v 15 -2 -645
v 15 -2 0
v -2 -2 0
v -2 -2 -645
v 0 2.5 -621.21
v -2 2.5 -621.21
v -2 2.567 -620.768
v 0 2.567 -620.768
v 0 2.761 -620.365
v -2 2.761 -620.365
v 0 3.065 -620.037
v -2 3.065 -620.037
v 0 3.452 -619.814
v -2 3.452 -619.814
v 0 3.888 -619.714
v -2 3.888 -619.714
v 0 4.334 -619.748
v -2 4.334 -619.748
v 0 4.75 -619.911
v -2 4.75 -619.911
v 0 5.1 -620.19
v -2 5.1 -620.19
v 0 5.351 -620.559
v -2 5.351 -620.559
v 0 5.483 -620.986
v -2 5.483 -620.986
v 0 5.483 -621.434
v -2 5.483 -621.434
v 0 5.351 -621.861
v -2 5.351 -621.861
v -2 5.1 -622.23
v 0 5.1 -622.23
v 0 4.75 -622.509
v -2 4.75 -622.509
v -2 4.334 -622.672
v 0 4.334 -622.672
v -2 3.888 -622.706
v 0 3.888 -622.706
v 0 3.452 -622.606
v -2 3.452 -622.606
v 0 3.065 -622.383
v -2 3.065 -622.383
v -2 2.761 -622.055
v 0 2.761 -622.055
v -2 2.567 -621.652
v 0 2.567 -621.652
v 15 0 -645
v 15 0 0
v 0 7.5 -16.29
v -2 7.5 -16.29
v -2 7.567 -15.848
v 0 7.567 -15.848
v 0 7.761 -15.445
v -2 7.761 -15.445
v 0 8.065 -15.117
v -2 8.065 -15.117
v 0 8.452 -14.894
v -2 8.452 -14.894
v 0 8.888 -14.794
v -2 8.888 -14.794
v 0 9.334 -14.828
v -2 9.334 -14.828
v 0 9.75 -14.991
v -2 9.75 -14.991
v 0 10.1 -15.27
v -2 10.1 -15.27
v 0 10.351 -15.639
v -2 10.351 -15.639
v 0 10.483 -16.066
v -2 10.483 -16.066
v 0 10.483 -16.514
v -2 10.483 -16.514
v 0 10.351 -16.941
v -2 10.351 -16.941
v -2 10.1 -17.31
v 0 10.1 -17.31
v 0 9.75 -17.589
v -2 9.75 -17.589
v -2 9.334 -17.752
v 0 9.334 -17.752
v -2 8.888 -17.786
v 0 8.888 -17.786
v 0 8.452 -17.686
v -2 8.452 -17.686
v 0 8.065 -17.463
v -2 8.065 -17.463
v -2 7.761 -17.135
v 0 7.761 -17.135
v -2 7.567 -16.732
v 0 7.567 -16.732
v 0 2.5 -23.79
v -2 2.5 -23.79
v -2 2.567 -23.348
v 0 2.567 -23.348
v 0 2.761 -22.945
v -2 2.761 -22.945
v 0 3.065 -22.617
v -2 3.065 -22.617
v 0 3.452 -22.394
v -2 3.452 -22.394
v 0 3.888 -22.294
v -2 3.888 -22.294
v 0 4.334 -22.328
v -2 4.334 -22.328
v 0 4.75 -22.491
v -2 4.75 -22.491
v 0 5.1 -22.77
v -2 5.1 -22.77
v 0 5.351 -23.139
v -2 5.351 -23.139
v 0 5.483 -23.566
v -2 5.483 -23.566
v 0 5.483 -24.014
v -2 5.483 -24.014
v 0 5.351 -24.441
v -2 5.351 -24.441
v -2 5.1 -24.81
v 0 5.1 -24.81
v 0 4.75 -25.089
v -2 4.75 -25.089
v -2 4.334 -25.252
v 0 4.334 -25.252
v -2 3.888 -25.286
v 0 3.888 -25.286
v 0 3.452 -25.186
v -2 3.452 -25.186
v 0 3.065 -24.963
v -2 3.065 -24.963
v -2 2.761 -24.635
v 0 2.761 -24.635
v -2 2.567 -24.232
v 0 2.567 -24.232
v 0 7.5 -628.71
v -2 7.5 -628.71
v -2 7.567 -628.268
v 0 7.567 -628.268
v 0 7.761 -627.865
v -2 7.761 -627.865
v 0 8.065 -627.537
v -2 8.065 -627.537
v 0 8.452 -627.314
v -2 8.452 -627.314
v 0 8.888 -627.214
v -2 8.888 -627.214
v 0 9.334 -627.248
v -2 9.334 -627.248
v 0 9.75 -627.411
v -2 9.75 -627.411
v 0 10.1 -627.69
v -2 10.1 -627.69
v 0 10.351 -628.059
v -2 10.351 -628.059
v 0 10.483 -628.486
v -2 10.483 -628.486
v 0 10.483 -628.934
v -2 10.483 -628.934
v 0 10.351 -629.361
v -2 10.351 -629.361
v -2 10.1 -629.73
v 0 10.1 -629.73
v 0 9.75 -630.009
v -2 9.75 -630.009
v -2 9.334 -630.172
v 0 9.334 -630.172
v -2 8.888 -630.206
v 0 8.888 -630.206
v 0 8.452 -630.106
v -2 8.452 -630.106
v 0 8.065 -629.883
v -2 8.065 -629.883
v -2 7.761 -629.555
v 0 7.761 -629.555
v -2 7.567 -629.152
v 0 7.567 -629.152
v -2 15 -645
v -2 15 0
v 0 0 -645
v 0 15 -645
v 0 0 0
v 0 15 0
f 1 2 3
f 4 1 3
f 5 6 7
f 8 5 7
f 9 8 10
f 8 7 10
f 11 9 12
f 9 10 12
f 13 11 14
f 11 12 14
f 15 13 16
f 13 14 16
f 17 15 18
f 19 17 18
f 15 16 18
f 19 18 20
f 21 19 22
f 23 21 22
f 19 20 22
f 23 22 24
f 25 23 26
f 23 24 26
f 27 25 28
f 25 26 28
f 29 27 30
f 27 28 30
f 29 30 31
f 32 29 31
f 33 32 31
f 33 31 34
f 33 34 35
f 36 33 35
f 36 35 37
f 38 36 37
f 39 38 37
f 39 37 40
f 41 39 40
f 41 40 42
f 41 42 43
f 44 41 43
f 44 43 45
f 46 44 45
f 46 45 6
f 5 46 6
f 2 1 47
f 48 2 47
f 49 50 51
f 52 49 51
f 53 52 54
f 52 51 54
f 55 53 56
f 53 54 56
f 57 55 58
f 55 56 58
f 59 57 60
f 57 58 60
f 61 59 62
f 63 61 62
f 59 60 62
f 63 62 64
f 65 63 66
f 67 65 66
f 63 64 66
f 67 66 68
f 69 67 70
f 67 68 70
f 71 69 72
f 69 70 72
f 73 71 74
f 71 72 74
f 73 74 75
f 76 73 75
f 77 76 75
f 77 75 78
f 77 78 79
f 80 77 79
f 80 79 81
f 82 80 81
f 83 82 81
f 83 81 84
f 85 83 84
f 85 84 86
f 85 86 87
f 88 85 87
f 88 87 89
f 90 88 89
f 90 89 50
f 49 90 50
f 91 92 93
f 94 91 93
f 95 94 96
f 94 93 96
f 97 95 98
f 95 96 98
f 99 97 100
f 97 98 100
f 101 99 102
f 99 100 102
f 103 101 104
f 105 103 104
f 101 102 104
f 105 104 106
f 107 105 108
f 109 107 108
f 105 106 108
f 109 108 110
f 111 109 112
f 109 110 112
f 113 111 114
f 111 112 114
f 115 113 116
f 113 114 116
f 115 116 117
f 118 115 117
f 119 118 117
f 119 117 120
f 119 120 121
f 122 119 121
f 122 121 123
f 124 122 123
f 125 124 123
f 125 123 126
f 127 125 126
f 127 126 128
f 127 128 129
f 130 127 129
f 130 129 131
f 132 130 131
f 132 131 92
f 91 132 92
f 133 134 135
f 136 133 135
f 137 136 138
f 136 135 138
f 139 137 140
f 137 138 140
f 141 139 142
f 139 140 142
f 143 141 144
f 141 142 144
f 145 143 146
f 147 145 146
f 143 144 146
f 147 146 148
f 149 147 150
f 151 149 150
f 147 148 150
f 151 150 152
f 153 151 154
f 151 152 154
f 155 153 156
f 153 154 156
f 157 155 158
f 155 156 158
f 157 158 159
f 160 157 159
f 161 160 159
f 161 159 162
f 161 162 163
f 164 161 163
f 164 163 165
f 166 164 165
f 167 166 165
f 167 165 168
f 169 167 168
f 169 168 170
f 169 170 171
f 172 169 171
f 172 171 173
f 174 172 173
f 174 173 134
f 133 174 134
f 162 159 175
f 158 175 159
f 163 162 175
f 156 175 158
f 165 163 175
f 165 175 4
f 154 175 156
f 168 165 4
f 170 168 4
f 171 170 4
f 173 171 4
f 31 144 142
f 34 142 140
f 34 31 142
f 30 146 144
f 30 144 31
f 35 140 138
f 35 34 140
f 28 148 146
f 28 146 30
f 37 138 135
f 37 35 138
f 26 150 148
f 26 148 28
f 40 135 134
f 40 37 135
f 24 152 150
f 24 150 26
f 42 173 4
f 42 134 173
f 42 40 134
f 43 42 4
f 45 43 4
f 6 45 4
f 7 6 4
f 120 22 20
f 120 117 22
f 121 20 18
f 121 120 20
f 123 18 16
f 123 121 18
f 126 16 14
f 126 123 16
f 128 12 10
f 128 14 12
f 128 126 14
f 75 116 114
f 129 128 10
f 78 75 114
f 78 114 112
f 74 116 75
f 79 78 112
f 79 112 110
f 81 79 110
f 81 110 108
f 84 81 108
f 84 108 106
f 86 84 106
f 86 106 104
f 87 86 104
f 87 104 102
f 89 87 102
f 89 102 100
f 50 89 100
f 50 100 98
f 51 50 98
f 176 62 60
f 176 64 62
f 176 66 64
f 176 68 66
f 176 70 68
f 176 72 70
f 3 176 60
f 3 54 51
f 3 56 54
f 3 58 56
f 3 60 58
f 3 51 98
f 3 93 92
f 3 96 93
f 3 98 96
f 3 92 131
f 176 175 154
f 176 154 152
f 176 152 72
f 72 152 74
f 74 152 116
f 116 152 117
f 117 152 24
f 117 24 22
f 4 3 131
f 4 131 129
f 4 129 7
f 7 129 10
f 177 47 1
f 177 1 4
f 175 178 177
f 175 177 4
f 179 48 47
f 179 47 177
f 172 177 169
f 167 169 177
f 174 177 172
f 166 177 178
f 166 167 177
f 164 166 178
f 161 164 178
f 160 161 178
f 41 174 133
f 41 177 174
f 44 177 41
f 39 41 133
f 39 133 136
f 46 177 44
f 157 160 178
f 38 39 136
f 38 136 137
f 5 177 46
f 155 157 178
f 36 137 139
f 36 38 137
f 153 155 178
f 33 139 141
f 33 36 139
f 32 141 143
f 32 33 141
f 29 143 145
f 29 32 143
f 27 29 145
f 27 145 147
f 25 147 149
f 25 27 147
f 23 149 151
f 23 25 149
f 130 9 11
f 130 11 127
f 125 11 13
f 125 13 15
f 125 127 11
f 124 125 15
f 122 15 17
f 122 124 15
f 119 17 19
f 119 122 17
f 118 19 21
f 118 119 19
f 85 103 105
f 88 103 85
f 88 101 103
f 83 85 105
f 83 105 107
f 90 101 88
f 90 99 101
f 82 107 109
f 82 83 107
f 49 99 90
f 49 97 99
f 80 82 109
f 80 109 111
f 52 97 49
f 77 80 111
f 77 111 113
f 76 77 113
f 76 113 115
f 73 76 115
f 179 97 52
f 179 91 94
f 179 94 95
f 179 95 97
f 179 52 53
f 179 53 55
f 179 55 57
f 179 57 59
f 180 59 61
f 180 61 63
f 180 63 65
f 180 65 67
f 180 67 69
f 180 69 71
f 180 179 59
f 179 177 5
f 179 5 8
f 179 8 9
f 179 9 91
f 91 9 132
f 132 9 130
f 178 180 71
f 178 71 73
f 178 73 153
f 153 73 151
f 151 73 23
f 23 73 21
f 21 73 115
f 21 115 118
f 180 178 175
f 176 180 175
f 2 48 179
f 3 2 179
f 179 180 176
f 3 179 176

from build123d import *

# Parameters (mm, degrees)
EXTRUDE_1_DEPTH     = 645
SKETCH_2_R          = 1.5
CUT_EXTRUDE_2_DEPTH = 646.305354077
SKETCH_3_W          = 2
SKETCH_3_H          = 2
EXTRUDE_2_DEPTH     = 645


with BuildPart() as part:
    # Эскиз1 → Бобышка-Вытянуть1 (new body)
    with BuildSketch(Plane.XY):
        Polygon((0, 0), (0, 13), (-2, 13), (-2, -2), (13, -2), (13, 0), align=None)
    extrude(amount=-EXTRUDE_1_DEPTH)

    # Эскиз2 → Вырез-Вытянуть2 (cut, through all)
    with BuildSketch(Plane.ZY.offset(2)):
        with Locations(Location((-23.79, 4, 0), (0, 0, 270))):
            Circle(SKETCH_2_R)
        with Locations(Location((-16.29, 9, 0), (0, 0, 270))):
            Circle(SKETCH_2_R)
        with Locations(Location((-628.71, 9, 0), (0, 0, 270))):
            Circle(SKETCH_2_R)
        with Locations(Location((-621.21, 4, 0), (0, 0, 270))):
            Circle(SKETCH_2_R)
    extrude(amount=-CUT_EXTRUDE_2_DEPTH, mode=Mode.SUBTRACT)

    # Эскиз3 → Бобышка-Вытянуть2 (add)
    with BuildSketch(Plane(origin=(0, 0, -645), x_dir=(-1, 0, 0), z_dir=(0, 0, -1))):
        with Locations((-14, -1)):
            Rectangle(SKETCH_3_W, SKETCH_3_H)
        with Locations((1, 14)):
            Rectangle(SKETCH_3_W, SKETCH_3_H)
    extrude(amount=-EXTRUDE_2_DEPTH)


solid = part.part
